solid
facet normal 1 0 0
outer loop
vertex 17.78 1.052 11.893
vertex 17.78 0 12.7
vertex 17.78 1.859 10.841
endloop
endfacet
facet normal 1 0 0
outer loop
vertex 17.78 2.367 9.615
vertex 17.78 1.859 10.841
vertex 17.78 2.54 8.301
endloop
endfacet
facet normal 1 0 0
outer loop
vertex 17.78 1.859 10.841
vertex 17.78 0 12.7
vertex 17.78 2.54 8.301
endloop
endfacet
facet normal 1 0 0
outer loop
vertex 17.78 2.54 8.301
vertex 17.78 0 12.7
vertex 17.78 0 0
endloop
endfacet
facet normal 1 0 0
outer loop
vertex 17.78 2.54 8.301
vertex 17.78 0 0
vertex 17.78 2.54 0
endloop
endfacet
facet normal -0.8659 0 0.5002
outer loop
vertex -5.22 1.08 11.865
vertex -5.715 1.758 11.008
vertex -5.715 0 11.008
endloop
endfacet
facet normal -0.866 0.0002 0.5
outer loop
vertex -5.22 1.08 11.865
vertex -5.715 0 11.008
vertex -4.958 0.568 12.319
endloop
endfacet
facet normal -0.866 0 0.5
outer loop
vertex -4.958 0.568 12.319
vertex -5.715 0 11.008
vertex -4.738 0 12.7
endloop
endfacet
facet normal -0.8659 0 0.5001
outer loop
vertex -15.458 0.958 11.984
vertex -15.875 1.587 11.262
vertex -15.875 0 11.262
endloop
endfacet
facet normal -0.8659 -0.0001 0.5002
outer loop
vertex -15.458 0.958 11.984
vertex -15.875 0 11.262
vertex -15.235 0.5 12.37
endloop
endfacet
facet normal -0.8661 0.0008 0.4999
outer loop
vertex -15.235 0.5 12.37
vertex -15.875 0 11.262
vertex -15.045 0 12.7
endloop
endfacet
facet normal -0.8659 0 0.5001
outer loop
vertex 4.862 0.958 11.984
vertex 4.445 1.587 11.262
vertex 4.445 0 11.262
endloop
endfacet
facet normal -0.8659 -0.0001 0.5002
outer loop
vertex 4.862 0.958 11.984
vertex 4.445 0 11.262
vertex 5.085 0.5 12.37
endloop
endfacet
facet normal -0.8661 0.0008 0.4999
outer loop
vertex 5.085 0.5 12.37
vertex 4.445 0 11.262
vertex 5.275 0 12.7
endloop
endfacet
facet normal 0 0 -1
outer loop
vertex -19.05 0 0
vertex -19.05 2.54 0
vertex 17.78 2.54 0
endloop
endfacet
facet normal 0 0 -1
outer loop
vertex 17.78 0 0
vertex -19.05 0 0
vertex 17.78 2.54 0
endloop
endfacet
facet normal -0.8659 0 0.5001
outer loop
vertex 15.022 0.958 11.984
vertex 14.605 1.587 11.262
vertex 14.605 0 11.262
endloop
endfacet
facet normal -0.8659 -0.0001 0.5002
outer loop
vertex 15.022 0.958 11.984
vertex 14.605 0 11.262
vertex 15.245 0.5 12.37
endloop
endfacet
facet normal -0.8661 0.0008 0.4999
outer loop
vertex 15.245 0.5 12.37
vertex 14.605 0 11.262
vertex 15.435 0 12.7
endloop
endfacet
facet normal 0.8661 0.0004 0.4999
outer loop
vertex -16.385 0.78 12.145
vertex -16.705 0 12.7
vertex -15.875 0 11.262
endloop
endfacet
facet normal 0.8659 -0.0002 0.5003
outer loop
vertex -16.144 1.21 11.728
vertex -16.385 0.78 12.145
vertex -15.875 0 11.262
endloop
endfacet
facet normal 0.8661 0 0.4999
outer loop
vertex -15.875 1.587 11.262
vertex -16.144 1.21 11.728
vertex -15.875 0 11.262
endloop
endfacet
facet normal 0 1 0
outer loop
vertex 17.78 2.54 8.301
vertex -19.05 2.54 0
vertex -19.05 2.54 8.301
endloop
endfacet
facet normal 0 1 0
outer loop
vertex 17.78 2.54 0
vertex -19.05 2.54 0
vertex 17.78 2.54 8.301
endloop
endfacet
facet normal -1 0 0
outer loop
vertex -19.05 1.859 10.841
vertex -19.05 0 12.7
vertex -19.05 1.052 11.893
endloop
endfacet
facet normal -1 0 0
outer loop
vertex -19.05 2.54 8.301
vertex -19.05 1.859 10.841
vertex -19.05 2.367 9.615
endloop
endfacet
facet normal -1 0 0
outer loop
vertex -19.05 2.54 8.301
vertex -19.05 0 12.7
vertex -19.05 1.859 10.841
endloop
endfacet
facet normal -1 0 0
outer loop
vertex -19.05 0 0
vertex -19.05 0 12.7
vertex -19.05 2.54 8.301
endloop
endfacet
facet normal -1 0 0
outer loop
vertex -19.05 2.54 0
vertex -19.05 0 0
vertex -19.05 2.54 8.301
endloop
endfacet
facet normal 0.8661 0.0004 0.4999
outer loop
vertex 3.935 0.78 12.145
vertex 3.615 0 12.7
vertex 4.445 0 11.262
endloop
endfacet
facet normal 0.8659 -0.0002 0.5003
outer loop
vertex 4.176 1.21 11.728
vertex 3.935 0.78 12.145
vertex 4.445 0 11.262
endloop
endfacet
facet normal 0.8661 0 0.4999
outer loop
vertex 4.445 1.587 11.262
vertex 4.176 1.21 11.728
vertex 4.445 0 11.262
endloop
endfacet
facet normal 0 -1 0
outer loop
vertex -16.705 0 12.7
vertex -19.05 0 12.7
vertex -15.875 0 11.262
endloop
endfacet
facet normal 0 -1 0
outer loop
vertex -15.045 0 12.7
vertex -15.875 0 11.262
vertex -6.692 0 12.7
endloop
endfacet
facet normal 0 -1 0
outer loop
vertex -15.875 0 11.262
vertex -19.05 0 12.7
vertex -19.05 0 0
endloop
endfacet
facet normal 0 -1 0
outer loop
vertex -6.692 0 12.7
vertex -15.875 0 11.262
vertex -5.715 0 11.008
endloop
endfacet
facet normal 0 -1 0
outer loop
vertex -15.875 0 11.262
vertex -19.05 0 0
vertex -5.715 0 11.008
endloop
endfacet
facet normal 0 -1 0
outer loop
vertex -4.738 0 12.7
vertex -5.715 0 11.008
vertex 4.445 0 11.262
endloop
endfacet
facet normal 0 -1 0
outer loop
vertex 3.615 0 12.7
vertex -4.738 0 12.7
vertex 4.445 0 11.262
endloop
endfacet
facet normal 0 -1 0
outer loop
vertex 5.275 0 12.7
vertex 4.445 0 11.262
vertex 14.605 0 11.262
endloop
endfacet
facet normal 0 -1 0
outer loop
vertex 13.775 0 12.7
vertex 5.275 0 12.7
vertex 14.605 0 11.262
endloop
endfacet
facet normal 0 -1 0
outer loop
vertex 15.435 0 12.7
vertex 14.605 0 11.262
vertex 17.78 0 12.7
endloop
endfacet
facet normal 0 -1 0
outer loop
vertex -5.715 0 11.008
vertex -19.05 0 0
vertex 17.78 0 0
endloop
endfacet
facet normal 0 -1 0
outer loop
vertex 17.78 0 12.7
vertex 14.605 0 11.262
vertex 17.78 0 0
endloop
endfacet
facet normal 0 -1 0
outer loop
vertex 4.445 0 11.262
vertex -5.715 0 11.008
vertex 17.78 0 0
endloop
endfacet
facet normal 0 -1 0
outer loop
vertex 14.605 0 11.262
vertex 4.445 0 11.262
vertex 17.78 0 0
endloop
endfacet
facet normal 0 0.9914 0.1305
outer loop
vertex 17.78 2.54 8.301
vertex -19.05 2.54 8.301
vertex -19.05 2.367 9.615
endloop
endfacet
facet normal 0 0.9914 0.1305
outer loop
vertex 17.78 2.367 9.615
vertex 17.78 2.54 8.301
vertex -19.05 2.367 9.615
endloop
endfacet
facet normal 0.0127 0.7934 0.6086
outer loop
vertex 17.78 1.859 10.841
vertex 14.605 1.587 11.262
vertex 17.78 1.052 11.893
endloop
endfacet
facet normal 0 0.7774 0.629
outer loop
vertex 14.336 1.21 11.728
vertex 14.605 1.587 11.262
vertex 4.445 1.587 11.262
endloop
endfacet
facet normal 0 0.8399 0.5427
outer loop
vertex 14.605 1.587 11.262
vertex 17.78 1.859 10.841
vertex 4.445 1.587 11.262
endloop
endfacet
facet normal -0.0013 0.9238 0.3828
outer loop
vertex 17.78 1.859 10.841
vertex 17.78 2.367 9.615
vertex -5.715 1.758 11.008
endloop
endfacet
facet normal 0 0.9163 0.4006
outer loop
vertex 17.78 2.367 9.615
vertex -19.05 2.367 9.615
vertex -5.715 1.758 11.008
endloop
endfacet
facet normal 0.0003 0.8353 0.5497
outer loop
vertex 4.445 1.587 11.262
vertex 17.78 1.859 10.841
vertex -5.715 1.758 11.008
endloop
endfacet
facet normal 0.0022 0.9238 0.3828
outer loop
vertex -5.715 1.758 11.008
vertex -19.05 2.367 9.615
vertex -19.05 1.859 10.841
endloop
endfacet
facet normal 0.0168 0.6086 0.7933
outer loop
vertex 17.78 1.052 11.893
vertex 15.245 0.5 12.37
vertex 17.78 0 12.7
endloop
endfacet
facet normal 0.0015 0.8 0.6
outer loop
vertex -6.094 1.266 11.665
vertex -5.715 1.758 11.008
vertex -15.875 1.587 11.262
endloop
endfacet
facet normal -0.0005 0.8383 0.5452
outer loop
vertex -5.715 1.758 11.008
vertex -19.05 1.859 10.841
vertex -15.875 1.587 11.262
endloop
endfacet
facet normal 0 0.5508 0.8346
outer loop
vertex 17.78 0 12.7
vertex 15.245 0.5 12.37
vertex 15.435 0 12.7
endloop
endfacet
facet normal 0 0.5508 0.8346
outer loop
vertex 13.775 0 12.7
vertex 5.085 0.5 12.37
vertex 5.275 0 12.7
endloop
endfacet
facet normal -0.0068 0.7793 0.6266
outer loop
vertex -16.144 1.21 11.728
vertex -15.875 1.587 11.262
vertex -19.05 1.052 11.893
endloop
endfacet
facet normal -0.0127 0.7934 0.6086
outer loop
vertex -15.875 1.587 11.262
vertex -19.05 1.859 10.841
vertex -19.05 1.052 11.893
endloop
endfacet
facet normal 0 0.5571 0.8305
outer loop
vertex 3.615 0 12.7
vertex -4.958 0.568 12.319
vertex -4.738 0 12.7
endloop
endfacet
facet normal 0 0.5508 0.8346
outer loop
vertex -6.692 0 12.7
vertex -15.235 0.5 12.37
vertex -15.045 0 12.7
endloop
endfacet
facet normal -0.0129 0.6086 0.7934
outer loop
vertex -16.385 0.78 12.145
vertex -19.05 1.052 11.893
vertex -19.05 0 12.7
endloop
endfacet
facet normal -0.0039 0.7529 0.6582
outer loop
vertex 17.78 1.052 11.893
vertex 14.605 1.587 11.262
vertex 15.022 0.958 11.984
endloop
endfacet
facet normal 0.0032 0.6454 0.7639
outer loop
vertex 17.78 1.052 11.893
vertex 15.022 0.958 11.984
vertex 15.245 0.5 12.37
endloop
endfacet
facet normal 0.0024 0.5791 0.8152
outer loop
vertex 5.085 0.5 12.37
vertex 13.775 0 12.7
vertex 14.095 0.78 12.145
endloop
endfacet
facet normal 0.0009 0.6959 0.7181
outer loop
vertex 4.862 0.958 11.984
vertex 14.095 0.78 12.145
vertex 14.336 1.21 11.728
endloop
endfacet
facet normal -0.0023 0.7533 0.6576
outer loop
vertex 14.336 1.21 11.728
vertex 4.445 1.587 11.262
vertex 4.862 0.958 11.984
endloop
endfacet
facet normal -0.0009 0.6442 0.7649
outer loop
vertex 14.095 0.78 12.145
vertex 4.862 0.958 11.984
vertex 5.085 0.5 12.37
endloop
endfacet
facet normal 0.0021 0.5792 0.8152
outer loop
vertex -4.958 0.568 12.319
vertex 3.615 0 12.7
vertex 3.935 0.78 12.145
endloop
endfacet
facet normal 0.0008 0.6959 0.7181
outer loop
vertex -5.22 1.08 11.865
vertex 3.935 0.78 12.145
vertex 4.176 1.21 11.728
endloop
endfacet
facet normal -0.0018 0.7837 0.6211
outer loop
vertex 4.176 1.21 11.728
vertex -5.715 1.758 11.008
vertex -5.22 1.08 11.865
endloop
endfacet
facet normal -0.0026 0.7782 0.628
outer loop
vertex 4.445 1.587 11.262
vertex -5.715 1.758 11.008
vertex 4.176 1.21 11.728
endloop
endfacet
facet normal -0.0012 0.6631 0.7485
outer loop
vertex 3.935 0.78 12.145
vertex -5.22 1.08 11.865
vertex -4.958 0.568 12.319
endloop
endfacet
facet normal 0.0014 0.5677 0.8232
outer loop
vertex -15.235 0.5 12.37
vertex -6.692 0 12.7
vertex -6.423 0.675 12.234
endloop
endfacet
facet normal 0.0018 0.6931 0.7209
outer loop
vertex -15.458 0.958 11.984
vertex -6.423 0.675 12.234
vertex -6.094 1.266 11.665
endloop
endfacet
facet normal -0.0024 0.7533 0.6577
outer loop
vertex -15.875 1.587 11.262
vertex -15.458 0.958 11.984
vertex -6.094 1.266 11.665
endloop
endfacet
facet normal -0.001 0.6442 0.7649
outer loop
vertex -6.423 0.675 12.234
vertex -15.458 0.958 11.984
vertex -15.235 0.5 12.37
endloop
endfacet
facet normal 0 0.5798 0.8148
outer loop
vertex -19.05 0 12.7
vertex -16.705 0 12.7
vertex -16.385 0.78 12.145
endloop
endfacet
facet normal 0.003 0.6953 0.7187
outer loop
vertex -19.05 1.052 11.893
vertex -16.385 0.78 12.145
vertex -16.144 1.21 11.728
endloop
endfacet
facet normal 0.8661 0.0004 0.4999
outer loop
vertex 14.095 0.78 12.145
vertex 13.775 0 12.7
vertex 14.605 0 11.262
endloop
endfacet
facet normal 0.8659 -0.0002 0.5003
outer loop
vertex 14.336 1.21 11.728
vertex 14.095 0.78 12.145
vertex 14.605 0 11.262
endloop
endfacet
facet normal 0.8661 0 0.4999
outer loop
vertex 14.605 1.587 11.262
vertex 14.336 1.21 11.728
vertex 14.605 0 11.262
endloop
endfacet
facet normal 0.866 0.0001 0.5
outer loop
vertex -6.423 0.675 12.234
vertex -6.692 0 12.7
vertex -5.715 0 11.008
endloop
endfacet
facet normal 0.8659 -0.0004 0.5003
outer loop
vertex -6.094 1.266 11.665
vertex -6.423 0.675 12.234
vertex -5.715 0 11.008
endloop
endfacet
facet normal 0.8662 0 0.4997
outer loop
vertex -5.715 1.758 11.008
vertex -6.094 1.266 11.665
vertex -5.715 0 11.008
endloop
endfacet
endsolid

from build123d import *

# Parameters (mm, degrees)
F0_W        = 36.83
F0_H        = 2.54
F1_DEPTH    = 12.7
F3_T1_DEPTH = 58.8270452561
F4_DEPTH    = 25.4


# Not quite as in the source:
# - a fillet or chamfer that OpenCascade refuses, or shapes differently, is made with other operations: its cross-section is extruded or revolved along the edge and cut away or added


with BuildPart() as f1:
    # F0 (on Top) → F1 (new body)
    with BuildSketch(Plane.XY):
        with Locations((-0.635, 1.27)):
            Rectangle(F0_W, F0_H)
    extrude(amount=F1_DEPTH)

    # F3: fillet of radius 5.08 on 1 edges, made by hand

    # F3_s2 → F3_t1 (cut)
    with BuildSketch(Plane.YZ.offset(-30.0485226281)):
        with BuildLine():
            ThreePointArc((2.54, 8.3005909488), (1.8594090512, 10.8405909488), (0, 12.7))
            Line((0, 12.7), (2.54, 12.7))
            Line((2.54, 12.7), (2.54, 8.3005909488))
        make_face()
    extrude(amount=F3_T1_DEPTH, mode=Mode.SUBTRACT)

    # F2 (on face) → F4 (cut)
    with BuildSketch(Plane.XZ):
        Polygon((-15.875, 11.2622954744), (-15.0449409051, 12.7), (-16.7050590949, 12.7), align=None)
        Polygon((-4.7382939367, 12.7), (-6.6917060633, 12.7), (-5.715, 11.0082954744), align=None)
        Polygon((5.2750590949, 12.7), (3.6149409051, 12.7), (4.445, 11.2622954744), align=None)
        Polygon((15.4350590949, 12.7), (13.7749409051, 12.7), (14.605, 11.2622954744), align=None)
    extrude(amount=-F4_DEPTH, mode=Mode.SUBTRACT)


solid = f1.part
